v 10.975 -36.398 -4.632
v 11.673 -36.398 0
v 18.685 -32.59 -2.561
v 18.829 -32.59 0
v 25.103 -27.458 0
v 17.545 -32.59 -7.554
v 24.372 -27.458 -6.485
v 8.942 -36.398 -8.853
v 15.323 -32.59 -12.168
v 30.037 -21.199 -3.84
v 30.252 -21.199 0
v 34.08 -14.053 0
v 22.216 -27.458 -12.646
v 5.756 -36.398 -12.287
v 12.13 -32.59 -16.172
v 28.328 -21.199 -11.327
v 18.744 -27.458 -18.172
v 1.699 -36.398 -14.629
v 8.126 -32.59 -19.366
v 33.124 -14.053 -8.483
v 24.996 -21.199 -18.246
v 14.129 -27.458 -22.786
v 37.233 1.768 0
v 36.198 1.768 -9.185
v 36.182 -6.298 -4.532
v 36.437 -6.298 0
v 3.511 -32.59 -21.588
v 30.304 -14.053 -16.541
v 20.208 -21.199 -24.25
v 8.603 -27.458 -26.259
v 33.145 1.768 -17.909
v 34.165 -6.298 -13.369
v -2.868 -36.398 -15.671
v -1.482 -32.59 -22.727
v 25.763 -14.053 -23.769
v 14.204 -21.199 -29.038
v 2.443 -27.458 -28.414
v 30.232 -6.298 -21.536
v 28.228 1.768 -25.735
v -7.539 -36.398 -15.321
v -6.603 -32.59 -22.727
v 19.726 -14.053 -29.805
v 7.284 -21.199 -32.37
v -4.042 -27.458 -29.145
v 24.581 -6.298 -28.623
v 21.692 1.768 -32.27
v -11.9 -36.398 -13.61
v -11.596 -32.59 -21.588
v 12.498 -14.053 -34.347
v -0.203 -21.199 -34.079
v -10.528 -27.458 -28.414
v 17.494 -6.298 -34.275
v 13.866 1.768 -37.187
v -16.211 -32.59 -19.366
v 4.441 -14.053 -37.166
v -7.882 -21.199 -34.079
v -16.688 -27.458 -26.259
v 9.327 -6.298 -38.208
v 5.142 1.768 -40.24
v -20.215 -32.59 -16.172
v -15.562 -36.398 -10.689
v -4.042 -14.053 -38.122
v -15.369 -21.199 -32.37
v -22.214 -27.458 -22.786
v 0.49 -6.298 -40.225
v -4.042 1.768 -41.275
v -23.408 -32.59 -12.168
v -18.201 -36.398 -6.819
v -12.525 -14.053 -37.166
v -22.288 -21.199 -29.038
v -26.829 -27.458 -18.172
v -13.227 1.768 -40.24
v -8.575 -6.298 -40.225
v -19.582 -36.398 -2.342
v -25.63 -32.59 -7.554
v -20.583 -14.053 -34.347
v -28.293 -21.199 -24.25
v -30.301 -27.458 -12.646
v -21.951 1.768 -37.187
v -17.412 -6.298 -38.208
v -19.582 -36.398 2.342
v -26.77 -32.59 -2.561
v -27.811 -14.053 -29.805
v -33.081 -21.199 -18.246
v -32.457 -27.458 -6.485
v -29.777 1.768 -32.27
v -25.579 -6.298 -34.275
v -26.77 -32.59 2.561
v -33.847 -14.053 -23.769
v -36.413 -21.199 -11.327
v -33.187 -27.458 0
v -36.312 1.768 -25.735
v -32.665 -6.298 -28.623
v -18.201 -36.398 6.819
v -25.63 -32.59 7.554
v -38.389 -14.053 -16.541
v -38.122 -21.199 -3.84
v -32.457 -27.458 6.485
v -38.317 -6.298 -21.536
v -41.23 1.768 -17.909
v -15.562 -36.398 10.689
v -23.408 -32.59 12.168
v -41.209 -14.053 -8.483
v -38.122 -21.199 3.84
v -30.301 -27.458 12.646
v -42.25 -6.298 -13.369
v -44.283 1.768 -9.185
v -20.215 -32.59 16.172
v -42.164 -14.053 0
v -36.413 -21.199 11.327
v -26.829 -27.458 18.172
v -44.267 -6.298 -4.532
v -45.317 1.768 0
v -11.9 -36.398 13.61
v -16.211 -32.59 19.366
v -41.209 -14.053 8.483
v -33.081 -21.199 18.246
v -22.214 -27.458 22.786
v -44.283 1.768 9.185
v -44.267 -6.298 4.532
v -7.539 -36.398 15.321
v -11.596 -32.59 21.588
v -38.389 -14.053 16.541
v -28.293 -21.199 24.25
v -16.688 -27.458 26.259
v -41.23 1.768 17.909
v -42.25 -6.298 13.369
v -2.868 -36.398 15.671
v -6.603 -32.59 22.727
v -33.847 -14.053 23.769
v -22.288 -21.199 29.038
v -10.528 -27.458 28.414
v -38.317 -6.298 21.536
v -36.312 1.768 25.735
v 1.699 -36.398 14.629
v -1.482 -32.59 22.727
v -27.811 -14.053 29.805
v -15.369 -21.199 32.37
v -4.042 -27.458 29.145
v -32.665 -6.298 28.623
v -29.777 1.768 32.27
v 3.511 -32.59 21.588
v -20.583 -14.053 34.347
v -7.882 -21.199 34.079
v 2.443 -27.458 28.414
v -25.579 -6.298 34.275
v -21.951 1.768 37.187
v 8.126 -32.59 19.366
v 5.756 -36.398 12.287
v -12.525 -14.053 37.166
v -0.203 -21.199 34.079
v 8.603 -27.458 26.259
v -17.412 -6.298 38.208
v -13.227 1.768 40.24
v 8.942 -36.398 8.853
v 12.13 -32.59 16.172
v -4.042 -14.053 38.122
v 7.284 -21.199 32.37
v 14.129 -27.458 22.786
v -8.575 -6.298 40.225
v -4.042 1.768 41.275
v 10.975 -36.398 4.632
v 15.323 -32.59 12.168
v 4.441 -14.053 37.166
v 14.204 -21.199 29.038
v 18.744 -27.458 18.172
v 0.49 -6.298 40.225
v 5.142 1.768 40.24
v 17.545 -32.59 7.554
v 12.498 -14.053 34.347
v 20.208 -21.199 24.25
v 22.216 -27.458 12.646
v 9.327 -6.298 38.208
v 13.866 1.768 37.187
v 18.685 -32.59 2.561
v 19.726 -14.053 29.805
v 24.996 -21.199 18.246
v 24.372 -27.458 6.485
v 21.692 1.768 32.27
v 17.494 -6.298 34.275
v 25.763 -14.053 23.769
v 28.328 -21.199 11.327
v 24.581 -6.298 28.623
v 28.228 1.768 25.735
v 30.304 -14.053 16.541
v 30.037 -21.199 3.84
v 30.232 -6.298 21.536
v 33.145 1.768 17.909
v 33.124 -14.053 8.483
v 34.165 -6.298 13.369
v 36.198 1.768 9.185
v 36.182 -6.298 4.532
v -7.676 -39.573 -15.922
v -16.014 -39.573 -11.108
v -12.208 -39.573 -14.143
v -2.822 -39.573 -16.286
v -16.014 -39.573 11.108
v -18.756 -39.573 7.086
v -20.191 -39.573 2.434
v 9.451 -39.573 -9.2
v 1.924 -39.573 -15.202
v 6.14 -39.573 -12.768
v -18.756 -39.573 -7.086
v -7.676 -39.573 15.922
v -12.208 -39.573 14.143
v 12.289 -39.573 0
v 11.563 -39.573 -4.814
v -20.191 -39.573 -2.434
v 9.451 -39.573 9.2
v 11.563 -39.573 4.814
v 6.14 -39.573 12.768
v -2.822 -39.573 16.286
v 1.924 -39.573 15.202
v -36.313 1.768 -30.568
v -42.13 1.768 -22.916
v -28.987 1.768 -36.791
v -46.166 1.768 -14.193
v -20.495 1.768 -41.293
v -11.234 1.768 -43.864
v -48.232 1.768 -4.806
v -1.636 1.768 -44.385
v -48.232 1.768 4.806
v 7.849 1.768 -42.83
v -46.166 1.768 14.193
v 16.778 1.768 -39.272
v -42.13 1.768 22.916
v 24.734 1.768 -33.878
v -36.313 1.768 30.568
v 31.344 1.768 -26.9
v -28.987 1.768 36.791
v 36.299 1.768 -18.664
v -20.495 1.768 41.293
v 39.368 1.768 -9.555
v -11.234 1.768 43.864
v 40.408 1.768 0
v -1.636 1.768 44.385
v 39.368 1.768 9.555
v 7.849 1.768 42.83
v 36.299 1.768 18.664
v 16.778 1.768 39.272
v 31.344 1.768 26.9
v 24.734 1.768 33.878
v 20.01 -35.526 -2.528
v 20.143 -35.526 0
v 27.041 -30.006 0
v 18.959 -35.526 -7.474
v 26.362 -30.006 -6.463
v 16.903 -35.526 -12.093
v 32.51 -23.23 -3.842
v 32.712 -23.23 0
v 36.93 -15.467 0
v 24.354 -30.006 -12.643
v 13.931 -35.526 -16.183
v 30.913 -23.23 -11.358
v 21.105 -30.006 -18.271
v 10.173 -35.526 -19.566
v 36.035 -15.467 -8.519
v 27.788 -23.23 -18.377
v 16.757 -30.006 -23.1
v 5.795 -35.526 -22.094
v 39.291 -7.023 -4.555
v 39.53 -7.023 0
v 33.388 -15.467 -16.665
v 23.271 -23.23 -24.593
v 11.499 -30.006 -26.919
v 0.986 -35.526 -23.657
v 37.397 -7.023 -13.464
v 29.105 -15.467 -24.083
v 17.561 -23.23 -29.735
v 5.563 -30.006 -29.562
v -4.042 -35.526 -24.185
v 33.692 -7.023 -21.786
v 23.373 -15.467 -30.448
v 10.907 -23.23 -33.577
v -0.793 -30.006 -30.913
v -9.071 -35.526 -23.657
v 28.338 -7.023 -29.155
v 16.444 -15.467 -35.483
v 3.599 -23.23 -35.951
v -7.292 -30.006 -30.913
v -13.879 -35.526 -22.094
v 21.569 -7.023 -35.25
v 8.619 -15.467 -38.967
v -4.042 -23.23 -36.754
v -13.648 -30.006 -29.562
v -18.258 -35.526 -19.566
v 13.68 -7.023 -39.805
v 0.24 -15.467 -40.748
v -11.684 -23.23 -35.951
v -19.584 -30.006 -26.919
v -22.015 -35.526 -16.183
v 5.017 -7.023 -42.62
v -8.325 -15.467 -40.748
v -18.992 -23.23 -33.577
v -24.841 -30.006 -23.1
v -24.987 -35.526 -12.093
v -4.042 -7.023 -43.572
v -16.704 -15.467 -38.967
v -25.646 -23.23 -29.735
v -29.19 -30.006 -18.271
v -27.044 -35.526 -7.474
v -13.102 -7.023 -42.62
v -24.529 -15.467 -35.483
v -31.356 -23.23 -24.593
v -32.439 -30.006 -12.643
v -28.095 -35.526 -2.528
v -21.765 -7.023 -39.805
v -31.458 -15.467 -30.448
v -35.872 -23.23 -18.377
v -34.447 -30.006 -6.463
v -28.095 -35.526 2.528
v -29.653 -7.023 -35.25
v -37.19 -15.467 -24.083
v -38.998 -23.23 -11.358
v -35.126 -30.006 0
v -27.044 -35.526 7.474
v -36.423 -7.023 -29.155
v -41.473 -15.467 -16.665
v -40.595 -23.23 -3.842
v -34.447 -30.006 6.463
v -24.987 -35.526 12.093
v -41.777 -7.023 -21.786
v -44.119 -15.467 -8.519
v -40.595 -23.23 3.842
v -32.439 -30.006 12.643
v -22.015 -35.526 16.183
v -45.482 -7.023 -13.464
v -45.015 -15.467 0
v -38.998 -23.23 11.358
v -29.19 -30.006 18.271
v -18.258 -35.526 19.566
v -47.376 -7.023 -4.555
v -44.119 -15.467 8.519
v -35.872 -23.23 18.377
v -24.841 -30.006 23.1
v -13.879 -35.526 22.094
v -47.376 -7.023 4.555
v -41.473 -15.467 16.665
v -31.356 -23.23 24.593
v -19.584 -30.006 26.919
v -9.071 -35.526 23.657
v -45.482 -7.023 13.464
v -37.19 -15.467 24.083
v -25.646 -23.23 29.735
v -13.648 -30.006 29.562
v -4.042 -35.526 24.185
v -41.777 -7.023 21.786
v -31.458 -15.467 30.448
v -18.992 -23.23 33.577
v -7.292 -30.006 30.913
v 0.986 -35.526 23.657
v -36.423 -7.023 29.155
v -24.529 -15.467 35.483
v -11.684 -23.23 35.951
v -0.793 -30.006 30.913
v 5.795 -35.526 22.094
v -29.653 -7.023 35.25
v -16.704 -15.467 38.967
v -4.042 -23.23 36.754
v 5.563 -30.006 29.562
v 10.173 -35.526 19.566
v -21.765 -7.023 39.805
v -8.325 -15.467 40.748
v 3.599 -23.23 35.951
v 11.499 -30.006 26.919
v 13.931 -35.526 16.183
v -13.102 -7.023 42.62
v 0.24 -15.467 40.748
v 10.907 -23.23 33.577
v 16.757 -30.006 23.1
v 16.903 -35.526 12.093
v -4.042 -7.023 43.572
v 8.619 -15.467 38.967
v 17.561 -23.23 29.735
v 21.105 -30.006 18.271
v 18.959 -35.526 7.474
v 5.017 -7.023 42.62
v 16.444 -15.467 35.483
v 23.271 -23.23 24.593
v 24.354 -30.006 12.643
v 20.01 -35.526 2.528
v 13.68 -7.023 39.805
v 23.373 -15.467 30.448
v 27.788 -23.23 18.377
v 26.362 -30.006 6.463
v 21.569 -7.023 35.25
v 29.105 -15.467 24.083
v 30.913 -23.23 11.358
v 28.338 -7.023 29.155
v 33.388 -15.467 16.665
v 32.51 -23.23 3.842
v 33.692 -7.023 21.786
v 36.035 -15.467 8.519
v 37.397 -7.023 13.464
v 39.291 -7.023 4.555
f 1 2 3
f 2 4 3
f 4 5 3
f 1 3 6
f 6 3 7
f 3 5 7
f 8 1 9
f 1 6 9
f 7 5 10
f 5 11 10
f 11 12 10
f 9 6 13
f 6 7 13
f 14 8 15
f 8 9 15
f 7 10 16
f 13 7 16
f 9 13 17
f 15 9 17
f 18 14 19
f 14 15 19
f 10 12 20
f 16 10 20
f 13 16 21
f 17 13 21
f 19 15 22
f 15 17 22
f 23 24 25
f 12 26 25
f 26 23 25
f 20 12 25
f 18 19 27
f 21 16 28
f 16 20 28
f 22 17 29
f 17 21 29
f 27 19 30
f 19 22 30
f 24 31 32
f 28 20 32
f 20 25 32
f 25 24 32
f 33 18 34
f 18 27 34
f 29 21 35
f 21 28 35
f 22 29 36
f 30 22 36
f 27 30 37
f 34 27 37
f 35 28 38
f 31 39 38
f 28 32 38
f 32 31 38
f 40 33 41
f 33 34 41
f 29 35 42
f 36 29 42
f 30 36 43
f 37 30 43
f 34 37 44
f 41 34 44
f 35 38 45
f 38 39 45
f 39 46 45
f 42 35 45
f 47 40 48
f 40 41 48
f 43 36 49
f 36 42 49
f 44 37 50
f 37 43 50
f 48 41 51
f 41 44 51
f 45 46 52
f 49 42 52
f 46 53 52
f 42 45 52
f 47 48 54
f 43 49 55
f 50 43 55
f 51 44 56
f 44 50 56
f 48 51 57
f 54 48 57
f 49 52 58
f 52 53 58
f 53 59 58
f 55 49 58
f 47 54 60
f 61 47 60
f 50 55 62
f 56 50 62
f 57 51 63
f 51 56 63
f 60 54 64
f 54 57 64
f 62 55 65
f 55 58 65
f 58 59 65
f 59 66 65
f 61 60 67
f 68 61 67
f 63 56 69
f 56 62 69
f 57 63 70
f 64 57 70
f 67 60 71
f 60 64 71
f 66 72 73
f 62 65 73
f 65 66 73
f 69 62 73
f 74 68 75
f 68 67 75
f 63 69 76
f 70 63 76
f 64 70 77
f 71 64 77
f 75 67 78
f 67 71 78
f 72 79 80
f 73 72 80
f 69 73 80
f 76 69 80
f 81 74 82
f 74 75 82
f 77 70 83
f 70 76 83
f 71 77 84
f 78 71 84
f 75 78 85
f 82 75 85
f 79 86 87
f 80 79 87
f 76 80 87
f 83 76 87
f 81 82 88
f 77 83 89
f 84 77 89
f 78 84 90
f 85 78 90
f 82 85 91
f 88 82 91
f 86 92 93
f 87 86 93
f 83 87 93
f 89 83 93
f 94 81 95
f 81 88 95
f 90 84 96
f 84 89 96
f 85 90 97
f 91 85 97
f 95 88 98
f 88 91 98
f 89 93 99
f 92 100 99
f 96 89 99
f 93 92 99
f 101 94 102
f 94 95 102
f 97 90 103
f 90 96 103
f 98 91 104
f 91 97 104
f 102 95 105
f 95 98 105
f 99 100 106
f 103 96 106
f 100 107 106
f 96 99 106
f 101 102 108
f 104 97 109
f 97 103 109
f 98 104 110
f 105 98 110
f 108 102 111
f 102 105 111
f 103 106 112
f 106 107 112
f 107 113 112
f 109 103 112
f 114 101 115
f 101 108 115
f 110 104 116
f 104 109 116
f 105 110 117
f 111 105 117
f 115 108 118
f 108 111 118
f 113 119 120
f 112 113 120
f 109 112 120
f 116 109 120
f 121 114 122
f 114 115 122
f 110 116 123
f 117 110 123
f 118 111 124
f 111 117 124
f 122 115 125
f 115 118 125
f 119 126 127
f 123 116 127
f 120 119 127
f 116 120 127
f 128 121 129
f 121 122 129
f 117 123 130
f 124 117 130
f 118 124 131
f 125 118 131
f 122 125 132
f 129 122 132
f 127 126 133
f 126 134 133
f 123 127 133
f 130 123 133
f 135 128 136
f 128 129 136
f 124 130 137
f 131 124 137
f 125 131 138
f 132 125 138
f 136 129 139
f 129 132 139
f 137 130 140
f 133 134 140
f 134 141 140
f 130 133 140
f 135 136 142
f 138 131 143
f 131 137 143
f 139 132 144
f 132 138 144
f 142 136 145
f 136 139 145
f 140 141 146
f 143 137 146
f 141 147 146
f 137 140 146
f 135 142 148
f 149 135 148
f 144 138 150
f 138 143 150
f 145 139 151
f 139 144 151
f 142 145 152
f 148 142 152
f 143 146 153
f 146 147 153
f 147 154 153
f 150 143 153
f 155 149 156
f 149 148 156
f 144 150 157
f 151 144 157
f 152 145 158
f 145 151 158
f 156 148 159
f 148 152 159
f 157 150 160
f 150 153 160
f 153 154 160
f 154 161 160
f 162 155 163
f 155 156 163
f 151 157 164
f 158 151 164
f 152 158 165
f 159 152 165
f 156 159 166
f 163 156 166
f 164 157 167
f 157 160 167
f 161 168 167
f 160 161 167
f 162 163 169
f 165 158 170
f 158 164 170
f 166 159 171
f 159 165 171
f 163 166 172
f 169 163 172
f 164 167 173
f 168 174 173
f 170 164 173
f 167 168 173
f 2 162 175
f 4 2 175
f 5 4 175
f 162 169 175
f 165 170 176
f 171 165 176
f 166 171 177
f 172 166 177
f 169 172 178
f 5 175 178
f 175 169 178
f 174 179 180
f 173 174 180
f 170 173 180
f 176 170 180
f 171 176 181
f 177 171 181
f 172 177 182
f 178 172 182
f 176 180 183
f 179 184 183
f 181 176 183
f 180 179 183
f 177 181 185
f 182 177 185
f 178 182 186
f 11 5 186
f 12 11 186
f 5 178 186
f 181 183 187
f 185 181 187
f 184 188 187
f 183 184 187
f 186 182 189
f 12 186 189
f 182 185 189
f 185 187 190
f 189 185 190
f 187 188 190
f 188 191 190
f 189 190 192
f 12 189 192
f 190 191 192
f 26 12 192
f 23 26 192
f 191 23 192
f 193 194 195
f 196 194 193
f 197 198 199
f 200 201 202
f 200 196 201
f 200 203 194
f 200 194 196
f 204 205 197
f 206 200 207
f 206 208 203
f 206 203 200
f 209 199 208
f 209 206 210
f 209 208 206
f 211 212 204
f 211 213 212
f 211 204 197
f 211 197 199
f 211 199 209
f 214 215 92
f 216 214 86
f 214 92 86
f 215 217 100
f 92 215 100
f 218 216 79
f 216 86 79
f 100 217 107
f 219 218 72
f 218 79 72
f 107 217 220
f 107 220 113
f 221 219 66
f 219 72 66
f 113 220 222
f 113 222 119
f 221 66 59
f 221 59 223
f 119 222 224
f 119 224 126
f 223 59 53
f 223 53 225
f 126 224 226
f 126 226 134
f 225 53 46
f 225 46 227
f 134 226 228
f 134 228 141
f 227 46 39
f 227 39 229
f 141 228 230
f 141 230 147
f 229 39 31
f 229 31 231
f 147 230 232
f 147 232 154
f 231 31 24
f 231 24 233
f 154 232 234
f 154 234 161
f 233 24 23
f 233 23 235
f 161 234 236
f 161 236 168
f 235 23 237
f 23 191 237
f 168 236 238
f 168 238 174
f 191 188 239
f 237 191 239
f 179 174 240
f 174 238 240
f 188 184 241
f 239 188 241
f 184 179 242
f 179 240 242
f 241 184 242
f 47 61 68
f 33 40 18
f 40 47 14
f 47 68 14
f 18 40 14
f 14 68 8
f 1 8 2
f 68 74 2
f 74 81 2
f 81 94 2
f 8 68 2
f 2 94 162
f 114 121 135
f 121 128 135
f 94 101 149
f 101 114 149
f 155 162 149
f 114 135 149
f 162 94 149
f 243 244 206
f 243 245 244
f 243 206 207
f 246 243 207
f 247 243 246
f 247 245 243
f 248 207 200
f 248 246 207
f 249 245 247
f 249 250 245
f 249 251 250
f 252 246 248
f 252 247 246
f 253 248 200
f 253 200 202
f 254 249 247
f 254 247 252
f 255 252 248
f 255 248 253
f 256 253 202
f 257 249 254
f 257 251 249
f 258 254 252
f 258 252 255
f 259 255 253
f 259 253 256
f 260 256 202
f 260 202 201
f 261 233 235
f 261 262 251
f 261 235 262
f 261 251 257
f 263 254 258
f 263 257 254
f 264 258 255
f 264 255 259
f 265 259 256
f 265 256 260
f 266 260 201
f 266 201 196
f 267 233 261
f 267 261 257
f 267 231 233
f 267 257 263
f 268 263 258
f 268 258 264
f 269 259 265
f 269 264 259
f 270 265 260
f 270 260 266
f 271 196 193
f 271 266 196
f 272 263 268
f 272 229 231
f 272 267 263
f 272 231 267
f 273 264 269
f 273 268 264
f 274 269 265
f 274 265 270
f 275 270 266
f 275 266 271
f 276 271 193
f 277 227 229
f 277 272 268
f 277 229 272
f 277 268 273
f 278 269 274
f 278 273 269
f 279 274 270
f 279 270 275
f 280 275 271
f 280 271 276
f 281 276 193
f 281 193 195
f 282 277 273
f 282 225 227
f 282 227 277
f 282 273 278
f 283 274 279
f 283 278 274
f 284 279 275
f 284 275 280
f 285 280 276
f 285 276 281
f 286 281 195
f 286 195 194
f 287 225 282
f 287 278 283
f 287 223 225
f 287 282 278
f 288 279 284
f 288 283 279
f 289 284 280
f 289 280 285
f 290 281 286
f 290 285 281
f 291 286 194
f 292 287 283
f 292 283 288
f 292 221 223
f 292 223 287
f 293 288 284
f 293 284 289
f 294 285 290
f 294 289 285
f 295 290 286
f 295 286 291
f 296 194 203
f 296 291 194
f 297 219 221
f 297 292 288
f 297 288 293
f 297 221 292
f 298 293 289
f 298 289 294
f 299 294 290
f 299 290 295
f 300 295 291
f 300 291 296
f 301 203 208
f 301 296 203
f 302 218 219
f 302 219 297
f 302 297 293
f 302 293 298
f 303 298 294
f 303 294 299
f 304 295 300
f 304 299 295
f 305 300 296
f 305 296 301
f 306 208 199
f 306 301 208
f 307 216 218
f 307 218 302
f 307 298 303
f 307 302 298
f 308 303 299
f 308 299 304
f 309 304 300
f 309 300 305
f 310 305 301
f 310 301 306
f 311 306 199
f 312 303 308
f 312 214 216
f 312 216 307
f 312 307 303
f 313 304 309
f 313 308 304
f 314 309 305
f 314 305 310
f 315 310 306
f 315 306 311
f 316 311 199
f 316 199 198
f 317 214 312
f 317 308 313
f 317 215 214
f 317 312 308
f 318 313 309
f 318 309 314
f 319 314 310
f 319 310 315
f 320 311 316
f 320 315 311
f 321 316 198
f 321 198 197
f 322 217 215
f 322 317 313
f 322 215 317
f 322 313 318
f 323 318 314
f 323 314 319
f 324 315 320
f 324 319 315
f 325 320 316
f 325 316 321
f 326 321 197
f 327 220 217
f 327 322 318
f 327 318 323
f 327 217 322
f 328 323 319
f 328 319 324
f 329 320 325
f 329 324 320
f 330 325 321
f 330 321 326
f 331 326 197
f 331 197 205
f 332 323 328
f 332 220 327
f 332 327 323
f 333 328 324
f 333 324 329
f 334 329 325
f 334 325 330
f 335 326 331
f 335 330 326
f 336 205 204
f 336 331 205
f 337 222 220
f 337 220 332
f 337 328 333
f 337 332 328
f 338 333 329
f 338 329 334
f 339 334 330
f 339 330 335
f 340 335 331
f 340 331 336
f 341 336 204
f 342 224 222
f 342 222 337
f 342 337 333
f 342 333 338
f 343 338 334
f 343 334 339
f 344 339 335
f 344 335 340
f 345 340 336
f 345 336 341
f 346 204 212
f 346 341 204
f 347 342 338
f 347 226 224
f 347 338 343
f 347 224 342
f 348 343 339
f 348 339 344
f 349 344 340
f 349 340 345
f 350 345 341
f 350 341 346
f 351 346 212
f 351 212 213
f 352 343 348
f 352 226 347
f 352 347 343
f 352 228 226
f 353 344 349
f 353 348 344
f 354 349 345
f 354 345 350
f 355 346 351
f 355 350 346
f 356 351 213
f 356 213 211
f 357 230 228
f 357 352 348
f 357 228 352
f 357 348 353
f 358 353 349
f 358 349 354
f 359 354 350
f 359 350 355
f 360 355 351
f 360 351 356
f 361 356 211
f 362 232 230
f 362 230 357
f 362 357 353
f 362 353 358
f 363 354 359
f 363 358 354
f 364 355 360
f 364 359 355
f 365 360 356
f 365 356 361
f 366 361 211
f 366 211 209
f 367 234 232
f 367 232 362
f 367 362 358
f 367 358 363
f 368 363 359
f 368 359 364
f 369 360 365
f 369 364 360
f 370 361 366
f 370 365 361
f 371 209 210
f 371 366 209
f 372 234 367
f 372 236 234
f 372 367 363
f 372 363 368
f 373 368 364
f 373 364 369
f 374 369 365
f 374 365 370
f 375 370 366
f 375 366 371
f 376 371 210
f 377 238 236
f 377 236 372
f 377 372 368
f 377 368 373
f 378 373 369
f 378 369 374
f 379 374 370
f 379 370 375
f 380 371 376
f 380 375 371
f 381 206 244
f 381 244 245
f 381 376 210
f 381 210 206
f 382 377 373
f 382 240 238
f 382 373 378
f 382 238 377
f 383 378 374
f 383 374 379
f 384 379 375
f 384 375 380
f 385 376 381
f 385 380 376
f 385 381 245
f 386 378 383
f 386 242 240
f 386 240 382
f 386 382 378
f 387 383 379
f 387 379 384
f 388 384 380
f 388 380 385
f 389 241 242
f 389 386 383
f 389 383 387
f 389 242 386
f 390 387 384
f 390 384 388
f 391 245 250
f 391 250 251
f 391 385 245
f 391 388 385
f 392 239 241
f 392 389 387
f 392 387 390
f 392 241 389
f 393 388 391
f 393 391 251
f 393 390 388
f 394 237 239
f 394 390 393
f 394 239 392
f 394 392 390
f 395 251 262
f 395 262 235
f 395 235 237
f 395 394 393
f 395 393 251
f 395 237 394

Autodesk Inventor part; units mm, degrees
ref_plane "YZ Plane" through (0, 0, 0) normal (1, 0, 0) x (0, 1, 0)
ref_plane "XZ Plane" through (0, 0, 0) normal (0, 1, 0) x (-1, 0, 0)
sketch "Sketch1" plane through (0, 0, 0) normal (0, 0, 1) x (1, 0, 0)
  arc A0 (-4.0424, -42.6815) -> (40.4076, 1.7685) centre (-4.0424, 1.7685) ccw
  line L0 (-4.0424, 1.7685) -> (40.4076, 1.7685)
  line L1 (-4.0424, 1.7685) -> (-4.0424, -42.6815)
  dimension "d0" = 88.9
revolve "Revolution1" add sketch "Sketch1" angle 360 about axis through (-4.0424, 1.7685, 0) along (0, -1, 0)
ref_plane "Work Plane2" through (-4.0424, 1.7685, 44.45) normal (0, 0, 1) x (1, 0, 0)
sketch "Sketch3" plane through (-4.0424, 1.7685, 44.45) normal (0, 0, 1) x (1, 0, 0)
  line L0 (-27.3232, -41.3412) -> (29.0699, -41.3412)
surface extrude "ExtrusionSrf2" sketch "Sketch3" against normal blind 127 shown no curves L0
split body "Split2" result one side removed by surface "ExtrusionSrf2" removed pieces at (7.0948, -40.569, -3.8851)
shell "Shell2" thickness 3.175 removed faces 1 at (-16.0293, 1.7685, -8.709)
properties part number "ORB-bottom"
